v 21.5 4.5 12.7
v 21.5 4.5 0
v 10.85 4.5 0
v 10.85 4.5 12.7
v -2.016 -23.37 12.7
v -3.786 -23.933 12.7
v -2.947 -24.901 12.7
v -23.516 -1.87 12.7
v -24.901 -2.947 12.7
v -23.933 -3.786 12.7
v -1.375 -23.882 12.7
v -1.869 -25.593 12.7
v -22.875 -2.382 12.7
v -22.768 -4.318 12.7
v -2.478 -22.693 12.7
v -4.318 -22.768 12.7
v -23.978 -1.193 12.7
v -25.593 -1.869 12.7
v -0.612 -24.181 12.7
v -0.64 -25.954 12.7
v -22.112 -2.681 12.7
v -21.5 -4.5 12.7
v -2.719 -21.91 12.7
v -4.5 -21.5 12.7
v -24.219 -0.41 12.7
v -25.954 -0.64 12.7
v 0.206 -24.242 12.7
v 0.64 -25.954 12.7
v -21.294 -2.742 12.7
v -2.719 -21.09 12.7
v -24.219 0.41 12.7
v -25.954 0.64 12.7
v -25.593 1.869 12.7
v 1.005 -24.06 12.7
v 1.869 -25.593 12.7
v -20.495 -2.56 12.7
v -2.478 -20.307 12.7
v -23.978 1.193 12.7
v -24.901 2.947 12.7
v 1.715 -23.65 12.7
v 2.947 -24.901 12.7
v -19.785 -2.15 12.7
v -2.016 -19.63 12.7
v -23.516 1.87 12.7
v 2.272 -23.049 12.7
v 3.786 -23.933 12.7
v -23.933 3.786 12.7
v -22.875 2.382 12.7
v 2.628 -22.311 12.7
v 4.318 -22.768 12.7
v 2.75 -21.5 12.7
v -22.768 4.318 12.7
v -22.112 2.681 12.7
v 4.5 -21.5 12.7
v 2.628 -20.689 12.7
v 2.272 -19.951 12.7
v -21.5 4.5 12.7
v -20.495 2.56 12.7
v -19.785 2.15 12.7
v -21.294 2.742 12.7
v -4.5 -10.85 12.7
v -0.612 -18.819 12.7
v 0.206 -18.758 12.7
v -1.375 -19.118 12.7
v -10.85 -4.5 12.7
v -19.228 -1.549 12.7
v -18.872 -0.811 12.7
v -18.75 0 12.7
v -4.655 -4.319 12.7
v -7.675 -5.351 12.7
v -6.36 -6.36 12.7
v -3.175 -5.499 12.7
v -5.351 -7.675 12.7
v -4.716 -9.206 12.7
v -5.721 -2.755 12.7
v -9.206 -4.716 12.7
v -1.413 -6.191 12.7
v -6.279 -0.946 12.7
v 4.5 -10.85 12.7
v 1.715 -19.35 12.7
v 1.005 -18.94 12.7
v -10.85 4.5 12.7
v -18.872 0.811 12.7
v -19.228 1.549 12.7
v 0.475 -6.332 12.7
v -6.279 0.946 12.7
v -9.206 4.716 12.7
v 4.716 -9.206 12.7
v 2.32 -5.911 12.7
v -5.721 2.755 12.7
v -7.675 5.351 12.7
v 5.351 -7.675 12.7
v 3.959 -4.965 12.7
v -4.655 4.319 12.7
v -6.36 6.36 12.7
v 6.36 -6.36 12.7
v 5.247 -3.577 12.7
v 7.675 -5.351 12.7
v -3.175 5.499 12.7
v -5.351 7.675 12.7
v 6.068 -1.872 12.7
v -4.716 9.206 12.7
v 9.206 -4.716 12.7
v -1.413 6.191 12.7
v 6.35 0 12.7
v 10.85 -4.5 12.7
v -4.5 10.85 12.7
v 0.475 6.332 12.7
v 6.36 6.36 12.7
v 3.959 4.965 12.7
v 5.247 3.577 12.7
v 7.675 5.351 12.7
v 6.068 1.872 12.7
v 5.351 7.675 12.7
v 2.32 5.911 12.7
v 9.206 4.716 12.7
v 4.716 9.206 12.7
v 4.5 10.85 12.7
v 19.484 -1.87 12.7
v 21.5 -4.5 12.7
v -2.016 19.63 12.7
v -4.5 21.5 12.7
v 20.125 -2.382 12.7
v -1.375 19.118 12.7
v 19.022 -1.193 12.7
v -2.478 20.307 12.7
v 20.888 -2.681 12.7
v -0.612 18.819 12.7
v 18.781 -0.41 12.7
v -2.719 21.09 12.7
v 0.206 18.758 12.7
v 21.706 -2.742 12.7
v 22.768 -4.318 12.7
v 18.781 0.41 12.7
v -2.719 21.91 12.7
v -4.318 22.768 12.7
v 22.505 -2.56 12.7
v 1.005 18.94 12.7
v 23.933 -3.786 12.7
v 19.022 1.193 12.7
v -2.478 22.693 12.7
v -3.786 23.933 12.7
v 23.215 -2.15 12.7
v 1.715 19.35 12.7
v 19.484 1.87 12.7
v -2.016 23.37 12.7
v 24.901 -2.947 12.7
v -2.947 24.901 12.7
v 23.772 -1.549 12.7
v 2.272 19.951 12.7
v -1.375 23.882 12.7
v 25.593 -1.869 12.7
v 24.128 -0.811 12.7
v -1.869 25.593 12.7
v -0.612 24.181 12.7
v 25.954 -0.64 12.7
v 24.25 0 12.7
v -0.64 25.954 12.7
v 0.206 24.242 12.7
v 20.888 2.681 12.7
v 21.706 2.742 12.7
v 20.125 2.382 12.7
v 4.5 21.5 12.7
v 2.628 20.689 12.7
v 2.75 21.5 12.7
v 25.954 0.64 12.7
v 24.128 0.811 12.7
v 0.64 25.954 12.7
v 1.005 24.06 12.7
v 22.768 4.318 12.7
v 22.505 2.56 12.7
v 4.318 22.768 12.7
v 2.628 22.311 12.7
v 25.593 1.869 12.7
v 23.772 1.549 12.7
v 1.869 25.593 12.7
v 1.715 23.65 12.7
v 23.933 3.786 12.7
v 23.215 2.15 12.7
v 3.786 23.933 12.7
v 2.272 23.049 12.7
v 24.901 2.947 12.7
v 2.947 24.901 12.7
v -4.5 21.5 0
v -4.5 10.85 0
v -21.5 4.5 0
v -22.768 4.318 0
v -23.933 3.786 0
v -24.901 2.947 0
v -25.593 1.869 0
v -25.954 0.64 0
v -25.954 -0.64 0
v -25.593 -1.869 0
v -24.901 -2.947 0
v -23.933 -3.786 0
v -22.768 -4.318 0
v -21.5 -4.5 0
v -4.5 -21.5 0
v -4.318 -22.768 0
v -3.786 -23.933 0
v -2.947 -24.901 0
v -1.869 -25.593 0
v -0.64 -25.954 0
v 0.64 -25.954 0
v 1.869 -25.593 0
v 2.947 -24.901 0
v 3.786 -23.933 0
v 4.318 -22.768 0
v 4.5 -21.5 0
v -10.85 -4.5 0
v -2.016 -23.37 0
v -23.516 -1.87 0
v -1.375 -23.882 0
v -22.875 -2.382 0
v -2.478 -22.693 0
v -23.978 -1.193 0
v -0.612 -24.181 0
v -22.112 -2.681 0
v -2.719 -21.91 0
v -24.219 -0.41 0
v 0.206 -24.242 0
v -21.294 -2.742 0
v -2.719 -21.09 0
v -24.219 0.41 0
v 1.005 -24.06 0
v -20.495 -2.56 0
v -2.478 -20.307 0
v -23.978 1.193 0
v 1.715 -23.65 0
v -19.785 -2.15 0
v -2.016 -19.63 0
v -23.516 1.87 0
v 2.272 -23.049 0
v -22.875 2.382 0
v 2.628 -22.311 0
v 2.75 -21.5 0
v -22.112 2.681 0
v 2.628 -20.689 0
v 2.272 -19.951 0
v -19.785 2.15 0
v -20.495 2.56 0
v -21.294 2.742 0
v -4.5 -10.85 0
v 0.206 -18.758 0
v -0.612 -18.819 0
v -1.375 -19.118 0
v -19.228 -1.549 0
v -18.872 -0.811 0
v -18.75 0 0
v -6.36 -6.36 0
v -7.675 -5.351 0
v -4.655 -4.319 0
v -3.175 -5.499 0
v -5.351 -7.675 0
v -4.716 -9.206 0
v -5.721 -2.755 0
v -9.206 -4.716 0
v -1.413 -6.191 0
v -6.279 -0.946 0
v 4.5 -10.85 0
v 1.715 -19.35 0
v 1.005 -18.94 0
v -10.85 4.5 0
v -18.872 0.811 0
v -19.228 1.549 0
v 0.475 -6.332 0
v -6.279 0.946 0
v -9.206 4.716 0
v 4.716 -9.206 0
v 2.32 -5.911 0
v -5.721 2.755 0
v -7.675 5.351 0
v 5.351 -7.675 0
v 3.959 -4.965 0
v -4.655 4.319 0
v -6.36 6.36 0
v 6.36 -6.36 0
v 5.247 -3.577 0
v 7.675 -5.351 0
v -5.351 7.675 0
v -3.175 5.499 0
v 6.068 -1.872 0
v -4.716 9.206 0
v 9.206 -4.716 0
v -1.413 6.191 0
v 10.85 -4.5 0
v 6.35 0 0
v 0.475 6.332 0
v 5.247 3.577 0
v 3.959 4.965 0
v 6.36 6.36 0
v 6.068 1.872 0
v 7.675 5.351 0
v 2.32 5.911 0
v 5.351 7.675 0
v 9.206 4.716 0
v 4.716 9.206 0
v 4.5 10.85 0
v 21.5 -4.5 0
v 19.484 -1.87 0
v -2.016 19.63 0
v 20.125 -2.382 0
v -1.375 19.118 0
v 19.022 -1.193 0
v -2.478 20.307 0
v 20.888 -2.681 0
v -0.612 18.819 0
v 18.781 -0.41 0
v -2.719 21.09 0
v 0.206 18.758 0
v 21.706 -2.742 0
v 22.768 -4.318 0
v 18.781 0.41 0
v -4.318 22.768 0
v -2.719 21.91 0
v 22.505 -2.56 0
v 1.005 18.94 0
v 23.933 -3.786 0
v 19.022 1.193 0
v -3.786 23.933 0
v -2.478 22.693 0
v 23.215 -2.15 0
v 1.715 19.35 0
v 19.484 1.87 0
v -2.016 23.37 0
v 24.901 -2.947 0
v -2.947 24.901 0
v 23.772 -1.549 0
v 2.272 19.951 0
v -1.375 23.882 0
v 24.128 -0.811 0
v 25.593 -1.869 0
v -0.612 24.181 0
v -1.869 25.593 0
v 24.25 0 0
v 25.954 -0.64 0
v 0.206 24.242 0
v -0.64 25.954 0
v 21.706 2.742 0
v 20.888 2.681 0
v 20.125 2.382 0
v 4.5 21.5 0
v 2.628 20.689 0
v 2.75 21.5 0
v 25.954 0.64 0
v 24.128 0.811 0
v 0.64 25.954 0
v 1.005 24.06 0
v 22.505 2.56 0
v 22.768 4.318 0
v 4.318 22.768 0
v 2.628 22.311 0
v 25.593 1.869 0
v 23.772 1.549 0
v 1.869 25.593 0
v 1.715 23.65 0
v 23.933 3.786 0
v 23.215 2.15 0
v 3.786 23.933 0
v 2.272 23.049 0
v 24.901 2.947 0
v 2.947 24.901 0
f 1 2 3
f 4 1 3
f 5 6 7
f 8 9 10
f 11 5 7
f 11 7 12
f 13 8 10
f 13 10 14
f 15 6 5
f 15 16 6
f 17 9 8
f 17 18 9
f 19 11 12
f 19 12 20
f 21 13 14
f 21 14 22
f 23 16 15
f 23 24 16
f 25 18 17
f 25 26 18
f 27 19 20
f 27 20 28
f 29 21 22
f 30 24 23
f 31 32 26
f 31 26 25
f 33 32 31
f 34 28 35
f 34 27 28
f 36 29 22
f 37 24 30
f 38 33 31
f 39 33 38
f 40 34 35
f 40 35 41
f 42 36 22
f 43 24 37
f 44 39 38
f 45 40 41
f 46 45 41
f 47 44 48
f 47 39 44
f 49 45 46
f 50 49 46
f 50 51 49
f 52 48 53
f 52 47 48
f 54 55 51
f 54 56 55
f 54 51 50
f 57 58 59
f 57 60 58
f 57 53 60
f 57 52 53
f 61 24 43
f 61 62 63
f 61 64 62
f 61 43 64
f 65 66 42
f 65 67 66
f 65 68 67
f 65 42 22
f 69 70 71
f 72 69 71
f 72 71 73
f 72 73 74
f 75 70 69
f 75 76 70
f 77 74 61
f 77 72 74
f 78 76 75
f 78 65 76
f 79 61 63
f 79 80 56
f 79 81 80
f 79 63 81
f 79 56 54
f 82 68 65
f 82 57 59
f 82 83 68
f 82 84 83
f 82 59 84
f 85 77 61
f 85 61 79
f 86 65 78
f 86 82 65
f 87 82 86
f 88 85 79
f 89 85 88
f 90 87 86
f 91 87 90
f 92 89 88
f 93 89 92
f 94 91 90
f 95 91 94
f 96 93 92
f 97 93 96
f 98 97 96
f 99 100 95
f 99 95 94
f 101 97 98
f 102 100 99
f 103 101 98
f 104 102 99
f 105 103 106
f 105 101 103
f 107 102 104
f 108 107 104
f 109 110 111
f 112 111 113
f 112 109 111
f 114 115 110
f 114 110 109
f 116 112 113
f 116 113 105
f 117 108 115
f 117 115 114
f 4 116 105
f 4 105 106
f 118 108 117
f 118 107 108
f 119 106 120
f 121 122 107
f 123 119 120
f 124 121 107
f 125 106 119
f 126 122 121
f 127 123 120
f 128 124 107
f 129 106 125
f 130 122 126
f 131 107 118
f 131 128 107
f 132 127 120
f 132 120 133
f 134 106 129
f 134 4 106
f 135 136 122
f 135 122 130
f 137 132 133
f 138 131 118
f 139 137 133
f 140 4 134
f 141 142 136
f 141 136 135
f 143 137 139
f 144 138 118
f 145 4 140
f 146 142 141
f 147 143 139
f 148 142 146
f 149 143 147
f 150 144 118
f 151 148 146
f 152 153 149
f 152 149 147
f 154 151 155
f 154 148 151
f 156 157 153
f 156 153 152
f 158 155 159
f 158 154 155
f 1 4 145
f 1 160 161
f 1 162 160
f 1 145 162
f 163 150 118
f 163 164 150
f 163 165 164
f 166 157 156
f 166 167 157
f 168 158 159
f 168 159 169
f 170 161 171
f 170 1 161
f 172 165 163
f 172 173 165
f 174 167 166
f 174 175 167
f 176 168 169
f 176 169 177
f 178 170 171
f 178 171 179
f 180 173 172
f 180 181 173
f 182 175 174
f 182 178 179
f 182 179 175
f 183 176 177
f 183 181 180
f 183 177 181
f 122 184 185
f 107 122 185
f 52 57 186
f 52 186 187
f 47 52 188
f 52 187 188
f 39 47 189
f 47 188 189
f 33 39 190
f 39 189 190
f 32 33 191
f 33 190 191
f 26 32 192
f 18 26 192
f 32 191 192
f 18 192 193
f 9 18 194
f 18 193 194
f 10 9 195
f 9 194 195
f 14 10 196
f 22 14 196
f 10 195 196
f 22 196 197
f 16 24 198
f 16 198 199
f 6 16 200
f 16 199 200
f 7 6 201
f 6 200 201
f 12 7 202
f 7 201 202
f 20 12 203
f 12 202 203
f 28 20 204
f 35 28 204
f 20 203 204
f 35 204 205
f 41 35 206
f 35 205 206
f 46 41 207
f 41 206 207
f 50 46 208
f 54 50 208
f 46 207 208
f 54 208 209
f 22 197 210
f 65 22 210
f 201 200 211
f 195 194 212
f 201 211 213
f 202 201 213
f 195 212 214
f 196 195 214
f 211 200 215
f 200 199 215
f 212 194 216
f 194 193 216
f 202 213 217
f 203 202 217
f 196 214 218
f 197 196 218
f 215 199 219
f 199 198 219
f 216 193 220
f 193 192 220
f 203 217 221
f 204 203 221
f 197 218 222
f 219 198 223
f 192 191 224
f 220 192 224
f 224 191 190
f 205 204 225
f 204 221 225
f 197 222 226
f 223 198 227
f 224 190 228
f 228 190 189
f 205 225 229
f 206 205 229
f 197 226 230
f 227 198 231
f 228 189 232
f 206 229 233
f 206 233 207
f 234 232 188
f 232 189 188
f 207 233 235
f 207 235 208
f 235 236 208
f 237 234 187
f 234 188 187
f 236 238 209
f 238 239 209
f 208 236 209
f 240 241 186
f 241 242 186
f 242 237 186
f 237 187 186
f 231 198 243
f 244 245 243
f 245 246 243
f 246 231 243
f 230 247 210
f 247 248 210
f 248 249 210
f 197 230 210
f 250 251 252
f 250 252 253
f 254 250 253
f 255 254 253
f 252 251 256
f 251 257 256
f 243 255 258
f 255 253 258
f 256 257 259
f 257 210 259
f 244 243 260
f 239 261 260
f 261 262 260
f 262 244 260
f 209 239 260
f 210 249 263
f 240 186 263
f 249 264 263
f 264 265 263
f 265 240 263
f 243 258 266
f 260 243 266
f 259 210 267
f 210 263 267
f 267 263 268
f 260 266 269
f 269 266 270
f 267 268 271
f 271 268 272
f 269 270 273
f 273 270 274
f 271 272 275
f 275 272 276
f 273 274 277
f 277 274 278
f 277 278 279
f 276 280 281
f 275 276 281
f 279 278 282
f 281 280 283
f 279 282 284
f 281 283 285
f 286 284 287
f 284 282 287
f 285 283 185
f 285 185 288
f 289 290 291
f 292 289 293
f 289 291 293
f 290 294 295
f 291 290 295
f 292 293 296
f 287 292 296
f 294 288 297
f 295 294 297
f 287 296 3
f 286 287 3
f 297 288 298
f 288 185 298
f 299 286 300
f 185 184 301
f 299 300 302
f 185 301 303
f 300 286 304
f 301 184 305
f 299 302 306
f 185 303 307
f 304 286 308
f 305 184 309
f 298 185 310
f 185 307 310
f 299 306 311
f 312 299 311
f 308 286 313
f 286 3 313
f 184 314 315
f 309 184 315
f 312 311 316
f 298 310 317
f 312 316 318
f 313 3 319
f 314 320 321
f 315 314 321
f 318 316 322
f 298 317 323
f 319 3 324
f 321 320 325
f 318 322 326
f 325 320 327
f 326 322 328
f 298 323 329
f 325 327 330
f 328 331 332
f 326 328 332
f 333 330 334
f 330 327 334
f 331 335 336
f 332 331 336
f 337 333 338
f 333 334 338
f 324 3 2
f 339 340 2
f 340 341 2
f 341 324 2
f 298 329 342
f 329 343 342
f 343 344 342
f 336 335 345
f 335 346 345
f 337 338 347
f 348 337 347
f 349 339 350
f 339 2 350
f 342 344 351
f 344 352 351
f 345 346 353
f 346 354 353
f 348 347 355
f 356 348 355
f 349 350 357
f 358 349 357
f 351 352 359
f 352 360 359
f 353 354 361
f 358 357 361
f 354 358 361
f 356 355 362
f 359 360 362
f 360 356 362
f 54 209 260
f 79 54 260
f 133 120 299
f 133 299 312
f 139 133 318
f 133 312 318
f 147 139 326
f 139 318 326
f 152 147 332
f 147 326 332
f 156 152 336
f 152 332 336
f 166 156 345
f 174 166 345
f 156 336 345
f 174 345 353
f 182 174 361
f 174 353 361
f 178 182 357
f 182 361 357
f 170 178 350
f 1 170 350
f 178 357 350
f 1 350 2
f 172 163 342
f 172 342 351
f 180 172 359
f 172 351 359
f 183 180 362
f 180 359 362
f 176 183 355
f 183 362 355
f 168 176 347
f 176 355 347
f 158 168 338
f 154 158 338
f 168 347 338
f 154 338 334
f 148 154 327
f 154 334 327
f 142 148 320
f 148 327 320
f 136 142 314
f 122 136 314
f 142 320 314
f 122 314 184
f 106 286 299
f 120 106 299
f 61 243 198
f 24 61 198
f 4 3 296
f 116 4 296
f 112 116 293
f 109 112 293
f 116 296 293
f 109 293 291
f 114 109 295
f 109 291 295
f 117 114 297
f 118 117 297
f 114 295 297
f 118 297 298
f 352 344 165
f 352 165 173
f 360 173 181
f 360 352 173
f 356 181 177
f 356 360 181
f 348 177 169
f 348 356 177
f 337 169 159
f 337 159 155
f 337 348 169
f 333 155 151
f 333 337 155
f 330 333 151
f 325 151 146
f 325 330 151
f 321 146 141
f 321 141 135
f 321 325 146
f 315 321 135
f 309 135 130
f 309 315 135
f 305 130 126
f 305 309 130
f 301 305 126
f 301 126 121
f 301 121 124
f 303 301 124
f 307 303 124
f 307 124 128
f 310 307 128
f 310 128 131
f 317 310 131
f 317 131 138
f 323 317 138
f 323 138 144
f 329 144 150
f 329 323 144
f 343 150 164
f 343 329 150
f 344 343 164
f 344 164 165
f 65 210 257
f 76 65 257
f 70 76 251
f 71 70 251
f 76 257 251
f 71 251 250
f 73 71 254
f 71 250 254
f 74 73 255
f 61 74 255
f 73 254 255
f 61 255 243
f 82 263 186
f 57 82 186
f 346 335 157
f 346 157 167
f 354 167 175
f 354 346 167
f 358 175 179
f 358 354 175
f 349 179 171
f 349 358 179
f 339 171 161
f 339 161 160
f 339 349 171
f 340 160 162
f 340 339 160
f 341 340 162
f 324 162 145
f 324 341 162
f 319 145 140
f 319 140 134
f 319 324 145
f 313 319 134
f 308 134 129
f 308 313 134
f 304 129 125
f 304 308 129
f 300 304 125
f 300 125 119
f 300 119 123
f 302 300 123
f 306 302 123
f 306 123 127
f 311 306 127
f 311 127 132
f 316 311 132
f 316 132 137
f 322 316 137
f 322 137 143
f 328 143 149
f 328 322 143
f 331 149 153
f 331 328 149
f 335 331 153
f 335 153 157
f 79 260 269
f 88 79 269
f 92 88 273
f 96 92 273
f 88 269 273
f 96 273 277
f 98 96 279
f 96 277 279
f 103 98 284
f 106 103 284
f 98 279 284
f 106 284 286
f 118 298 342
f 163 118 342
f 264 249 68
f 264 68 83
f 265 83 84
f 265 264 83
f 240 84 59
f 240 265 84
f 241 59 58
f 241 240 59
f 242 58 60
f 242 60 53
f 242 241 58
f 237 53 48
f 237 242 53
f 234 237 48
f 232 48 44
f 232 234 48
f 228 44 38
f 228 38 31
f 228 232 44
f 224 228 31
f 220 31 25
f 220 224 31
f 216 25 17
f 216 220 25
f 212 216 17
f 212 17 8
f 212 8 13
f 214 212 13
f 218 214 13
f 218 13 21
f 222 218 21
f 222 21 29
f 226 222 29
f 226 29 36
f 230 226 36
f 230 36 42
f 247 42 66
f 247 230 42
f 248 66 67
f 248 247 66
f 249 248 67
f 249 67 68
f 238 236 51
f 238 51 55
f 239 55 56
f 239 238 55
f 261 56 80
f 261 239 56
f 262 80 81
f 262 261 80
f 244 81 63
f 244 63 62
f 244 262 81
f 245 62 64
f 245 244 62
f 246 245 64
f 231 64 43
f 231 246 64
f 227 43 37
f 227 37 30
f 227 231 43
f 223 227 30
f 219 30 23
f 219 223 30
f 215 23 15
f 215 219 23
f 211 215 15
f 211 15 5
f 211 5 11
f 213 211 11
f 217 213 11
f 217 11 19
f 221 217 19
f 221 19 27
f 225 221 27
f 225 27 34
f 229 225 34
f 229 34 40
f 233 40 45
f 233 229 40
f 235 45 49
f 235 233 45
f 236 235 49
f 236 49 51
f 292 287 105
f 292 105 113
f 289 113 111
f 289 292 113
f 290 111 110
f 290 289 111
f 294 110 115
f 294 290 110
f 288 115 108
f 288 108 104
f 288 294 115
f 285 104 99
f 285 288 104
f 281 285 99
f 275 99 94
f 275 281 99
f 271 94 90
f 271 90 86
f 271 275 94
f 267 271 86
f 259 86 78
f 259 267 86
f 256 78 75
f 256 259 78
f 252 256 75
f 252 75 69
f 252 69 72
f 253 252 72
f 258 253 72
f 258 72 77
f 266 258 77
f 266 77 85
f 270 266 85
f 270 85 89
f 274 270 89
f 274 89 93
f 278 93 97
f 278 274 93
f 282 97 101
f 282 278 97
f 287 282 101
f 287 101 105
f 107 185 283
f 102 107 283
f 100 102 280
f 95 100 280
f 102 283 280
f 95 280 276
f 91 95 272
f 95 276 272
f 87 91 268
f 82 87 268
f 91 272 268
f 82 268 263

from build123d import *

# Parameters (mm, degrees)
F0_R     = 2.75
F0_R_2   = 6.35
F1_DEPTH = 12.7


with BuildPart() as f1:
    # F0 (on Top) → F1 (new body)
    with BuildSketch(Plane.XY):
        with BuildLine():
            Line((4.5, 10.85), (4.5, 21.5))
            ThreePointArc((4.5, 21.5), (0, 26), (-4.5, 21.5))
            Line((-4.5, 21.5), (-4.5, 10.85))
            ThreePointArc((-4.5, 10.85), (-6.359872, 6.359872), (-10.85, 4.5))
            Line((-10.85, 4.5), (-21.5, 4.5))
            ThreePointArc((-21.5, 4.5), (-26, 0), (-21.5, -4.5))
            Line((-21.5, -4.5), (-10.85, -4.5))
            ThreePointArc((-10.85, -4.5), (-6.359872, -6.359872), (-4.5, -10.85))
            Line((-4.5, -10.85), (-4.5, -21.5))
            ThreePointArc((-4.5, -21.5), (0, -26), (4.5, -21.5))
            Line((4.5, -21.5), (4.5, -10.85))
            ThreePointArc((4.5, -10.85), (6.359872, -6.359872), (10.85, -4.5))
            Line((10.85, -4.5), (21.5, -4.5))
            ThreePointArc((21.5, -4.5), (26, 0), (21.5, 4.5))
            Line((21.5, 4.5), (10.85, 4.5))
            ThreePointArc((10.85, 4.5), (6.359872, 6.359872), (4.5, 10.85))
        make_face()
        with Locations((0, -21.5)):
            Circle(F0_R, mode=Mode.SUBTRACT)
        with Locations((-21.5, 0)):
            Circle(F0_R, mode=Mode.SUBTRACT)
        Circle(F0_R_2, mode=Mode.SUBTRACT)
        with Locations((21.5, 0)):
            Circle(F0_R, mode=Mode.SUBTRACT)
        with Locations((0, 21.5)):
            Circle(F0_R, mode=Mode.SUBTRACT)
    extrude(amount=F1_DEPTH)


solid = f1.part
